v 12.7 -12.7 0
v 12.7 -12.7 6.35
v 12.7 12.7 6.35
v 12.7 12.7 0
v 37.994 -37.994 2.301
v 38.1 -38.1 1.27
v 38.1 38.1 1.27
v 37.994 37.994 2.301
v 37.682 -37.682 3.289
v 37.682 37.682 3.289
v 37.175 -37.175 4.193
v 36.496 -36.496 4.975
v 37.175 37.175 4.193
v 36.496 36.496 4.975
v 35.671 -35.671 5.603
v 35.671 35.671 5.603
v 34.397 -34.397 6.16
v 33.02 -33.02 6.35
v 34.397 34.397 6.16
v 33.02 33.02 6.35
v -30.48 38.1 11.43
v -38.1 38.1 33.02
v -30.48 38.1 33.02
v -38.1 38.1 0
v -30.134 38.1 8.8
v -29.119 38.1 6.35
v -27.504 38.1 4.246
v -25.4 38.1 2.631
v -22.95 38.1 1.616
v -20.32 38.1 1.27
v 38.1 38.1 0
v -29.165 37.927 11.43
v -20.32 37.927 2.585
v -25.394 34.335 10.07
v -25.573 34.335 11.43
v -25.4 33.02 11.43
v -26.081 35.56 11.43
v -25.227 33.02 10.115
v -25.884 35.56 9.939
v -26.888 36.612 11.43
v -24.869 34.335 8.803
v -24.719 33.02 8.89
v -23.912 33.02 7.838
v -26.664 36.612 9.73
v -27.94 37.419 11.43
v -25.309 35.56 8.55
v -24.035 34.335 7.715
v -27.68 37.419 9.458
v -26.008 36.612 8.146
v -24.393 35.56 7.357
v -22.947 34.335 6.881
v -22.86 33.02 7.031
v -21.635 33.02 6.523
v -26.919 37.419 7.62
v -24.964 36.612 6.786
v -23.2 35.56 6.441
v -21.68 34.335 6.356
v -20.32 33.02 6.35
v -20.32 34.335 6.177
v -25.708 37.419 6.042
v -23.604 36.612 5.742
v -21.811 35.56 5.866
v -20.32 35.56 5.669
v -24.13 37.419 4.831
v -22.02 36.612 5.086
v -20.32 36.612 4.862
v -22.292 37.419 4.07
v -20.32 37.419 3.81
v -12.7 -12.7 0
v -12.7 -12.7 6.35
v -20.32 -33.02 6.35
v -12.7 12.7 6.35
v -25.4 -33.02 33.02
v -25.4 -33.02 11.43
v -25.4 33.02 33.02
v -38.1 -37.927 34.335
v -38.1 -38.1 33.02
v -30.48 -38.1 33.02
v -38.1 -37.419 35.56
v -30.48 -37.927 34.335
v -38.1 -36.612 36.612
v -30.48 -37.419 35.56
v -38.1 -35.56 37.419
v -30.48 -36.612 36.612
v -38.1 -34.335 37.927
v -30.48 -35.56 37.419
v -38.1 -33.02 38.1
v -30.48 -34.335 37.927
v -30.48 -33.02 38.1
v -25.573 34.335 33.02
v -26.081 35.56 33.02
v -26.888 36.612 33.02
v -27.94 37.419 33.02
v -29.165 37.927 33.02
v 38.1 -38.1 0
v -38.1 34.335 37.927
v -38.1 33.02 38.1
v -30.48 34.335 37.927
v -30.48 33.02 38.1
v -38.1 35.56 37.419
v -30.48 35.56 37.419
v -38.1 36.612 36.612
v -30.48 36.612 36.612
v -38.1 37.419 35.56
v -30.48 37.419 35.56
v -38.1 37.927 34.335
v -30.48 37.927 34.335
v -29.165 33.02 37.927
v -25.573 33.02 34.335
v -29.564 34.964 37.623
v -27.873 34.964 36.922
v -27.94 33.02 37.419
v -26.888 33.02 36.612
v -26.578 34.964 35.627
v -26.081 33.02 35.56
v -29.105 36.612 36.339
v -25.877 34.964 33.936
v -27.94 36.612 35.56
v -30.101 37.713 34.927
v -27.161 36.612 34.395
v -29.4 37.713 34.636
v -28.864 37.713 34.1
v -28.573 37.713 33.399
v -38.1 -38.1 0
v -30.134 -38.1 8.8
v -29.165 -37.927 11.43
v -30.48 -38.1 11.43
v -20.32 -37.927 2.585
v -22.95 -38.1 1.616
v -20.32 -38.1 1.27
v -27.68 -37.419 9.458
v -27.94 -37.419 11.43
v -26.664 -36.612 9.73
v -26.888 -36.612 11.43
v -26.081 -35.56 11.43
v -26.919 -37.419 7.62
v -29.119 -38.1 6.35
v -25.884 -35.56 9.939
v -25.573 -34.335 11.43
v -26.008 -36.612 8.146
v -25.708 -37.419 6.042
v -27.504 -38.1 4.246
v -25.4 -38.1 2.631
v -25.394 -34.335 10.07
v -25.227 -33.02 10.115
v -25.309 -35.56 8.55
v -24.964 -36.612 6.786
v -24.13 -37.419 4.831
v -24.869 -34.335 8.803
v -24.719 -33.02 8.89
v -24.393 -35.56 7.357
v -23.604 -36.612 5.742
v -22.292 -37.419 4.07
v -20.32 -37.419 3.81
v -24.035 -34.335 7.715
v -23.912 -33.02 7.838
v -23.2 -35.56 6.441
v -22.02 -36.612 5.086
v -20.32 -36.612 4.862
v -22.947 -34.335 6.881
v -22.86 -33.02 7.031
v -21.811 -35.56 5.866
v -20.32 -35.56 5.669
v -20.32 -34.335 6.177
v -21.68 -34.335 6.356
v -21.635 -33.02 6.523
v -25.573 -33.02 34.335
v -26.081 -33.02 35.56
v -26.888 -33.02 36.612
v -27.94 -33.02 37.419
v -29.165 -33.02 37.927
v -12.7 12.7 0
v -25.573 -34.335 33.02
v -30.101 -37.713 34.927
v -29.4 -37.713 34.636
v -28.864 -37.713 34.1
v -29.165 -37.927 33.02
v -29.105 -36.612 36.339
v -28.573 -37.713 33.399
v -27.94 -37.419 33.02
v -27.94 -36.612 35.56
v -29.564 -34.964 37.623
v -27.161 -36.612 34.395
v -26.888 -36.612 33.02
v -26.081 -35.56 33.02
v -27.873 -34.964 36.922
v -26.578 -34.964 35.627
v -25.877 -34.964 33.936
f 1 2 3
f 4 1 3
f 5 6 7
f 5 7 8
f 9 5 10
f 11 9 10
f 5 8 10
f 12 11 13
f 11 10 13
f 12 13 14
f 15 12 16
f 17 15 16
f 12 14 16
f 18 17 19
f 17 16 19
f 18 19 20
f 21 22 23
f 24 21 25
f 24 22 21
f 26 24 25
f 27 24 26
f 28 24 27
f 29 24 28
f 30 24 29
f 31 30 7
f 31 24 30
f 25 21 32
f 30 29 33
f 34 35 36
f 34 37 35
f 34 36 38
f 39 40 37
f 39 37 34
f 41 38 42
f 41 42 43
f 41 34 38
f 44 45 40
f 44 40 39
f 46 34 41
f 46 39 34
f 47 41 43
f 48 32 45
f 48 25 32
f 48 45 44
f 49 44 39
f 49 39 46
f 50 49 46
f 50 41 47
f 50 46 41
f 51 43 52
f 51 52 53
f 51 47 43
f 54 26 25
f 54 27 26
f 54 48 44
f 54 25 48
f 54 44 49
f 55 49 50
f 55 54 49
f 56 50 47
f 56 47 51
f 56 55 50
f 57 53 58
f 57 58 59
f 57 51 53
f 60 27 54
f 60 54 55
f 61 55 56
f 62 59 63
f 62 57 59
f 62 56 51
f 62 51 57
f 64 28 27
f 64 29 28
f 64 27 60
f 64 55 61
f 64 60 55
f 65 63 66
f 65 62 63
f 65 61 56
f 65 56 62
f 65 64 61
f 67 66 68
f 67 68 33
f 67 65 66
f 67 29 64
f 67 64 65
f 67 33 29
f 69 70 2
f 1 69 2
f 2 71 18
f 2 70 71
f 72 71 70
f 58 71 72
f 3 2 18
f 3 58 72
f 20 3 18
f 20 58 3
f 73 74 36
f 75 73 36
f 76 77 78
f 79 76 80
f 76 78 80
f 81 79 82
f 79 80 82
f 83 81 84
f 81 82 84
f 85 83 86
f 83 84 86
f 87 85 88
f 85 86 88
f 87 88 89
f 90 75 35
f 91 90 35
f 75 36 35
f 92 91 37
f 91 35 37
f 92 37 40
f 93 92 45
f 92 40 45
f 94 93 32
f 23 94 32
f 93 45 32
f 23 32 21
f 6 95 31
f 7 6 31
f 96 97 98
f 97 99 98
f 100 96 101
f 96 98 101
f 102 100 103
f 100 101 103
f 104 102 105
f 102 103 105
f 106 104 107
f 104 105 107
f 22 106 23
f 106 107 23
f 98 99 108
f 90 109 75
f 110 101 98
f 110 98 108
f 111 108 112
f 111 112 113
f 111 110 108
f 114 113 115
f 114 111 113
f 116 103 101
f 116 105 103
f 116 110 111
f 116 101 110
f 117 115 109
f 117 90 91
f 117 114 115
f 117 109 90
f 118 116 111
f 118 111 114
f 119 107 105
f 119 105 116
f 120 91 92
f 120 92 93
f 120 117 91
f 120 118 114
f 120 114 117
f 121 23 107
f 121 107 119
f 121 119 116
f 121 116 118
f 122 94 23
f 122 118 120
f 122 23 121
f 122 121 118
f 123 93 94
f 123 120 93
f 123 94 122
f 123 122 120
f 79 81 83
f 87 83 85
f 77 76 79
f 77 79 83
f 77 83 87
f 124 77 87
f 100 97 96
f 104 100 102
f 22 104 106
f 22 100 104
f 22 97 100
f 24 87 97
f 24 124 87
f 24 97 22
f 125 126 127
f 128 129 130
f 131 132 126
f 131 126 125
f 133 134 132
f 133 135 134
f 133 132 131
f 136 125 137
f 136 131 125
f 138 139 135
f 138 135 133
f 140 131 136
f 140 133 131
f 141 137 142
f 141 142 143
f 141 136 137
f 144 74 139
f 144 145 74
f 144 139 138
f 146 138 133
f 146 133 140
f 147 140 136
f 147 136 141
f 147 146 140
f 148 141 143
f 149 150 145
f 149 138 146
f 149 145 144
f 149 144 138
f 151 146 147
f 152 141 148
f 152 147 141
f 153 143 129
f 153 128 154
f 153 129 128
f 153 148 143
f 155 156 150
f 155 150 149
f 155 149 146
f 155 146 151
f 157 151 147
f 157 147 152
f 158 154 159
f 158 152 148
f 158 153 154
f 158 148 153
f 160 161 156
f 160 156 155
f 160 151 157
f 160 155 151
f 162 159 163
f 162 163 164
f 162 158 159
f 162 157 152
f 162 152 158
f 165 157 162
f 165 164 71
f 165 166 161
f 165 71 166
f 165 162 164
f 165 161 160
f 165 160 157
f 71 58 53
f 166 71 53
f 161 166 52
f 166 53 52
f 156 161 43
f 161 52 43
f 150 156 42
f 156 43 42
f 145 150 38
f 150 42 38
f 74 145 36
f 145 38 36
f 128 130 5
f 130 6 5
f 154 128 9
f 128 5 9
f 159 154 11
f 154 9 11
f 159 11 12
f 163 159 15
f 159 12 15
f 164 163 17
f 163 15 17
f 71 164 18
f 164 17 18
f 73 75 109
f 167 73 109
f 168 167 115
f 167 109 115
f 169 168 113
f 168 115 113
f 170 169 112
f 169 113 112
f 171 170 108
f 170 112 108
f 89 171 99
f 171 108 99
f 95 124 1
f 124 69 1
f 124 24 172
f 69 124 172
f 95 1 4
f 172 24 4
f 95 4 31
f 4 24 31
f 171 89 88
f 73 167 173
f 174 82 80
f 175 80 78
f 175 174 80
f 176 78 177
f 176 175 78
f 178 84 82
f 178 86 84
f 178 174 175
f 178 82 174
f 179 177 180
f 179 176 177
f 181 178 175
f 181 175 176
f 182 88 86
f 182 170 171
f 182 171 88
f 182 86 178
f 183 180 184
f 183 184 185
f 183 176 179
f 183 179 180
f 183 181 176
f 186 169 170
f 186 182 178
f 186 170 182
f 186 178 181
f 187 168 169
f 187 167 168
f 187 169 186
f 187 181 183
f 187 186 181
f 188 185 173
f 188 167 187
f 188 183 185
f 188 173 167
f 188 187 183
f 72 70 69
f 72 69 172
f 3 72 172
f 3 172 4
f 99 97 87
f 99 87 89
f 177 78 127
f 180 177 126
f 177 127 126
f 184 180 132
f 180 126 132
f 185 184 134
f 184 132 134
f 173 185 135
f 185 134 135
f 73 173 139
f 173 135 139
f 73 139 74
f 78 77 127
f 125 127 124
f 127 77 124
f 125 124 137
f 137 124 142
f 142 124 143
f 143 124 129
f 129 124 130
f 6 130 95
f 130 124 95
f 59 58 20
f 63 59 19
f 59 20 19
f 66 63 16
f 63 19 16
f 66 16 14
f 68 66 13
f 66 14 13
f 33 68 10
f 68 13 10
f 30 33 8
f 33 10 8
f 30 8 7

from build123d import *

# Parameters (mm, degrees)
F0_W     = 76.2
F0_H     = 76.2
F1_DEPTH = 6.35
F2_W     = 25.4
F2_H     = 25.4
F3_DEPTH = 25.4
F4_W     = 12.7
F4_H     = 76.2
F5_DEPTH = 31.75
F6_R     = 5.08
F7_R     = 5.08


with BuildPart() as f1:
    # F0 (on Top) → F1 (new body)
    with BuildSketch(Plane.XY):
        Rectangle(F0_W, F0_H)
    extrude(amount=F1_DEPTH)

    # F2 (on face) → F3 (cut)
    with BuildSketch(Plane.XY.offset(6.35)):
        Rectangle(F2_W, F2_H)
    extrude(amount=-F3_DEPTH, mode=Mode.SUBTRACT)

    # F4 (on face) → F5 (join)
    with BuildSketch(Plane.XY.offset(6.35)):
        with Locations((-31.75, 0)):
            Rectangle(F4_W, F4_H)
    extrude(amount=F5_DEPTH)

    # F6
    f6_edges = [f1.edges().sort_by_distance(p)[0] for p in [
        (-25.4, 0, 38.1),
        (-25.4, 0, 6.35),
    ]]
    fillet(f6_edges, radius=F6_R)

    # F7
    f7_edges = [f1.edges().sort_by_distance(p)[0] for p in [
        (8.89, -38.1, 6.35),
        (38.1, 0, 6.35),
        (8.89, 38.1, 6.35),
    ]]
    fillet(f7_edges, radius=F7_R)


solid = f1.part
